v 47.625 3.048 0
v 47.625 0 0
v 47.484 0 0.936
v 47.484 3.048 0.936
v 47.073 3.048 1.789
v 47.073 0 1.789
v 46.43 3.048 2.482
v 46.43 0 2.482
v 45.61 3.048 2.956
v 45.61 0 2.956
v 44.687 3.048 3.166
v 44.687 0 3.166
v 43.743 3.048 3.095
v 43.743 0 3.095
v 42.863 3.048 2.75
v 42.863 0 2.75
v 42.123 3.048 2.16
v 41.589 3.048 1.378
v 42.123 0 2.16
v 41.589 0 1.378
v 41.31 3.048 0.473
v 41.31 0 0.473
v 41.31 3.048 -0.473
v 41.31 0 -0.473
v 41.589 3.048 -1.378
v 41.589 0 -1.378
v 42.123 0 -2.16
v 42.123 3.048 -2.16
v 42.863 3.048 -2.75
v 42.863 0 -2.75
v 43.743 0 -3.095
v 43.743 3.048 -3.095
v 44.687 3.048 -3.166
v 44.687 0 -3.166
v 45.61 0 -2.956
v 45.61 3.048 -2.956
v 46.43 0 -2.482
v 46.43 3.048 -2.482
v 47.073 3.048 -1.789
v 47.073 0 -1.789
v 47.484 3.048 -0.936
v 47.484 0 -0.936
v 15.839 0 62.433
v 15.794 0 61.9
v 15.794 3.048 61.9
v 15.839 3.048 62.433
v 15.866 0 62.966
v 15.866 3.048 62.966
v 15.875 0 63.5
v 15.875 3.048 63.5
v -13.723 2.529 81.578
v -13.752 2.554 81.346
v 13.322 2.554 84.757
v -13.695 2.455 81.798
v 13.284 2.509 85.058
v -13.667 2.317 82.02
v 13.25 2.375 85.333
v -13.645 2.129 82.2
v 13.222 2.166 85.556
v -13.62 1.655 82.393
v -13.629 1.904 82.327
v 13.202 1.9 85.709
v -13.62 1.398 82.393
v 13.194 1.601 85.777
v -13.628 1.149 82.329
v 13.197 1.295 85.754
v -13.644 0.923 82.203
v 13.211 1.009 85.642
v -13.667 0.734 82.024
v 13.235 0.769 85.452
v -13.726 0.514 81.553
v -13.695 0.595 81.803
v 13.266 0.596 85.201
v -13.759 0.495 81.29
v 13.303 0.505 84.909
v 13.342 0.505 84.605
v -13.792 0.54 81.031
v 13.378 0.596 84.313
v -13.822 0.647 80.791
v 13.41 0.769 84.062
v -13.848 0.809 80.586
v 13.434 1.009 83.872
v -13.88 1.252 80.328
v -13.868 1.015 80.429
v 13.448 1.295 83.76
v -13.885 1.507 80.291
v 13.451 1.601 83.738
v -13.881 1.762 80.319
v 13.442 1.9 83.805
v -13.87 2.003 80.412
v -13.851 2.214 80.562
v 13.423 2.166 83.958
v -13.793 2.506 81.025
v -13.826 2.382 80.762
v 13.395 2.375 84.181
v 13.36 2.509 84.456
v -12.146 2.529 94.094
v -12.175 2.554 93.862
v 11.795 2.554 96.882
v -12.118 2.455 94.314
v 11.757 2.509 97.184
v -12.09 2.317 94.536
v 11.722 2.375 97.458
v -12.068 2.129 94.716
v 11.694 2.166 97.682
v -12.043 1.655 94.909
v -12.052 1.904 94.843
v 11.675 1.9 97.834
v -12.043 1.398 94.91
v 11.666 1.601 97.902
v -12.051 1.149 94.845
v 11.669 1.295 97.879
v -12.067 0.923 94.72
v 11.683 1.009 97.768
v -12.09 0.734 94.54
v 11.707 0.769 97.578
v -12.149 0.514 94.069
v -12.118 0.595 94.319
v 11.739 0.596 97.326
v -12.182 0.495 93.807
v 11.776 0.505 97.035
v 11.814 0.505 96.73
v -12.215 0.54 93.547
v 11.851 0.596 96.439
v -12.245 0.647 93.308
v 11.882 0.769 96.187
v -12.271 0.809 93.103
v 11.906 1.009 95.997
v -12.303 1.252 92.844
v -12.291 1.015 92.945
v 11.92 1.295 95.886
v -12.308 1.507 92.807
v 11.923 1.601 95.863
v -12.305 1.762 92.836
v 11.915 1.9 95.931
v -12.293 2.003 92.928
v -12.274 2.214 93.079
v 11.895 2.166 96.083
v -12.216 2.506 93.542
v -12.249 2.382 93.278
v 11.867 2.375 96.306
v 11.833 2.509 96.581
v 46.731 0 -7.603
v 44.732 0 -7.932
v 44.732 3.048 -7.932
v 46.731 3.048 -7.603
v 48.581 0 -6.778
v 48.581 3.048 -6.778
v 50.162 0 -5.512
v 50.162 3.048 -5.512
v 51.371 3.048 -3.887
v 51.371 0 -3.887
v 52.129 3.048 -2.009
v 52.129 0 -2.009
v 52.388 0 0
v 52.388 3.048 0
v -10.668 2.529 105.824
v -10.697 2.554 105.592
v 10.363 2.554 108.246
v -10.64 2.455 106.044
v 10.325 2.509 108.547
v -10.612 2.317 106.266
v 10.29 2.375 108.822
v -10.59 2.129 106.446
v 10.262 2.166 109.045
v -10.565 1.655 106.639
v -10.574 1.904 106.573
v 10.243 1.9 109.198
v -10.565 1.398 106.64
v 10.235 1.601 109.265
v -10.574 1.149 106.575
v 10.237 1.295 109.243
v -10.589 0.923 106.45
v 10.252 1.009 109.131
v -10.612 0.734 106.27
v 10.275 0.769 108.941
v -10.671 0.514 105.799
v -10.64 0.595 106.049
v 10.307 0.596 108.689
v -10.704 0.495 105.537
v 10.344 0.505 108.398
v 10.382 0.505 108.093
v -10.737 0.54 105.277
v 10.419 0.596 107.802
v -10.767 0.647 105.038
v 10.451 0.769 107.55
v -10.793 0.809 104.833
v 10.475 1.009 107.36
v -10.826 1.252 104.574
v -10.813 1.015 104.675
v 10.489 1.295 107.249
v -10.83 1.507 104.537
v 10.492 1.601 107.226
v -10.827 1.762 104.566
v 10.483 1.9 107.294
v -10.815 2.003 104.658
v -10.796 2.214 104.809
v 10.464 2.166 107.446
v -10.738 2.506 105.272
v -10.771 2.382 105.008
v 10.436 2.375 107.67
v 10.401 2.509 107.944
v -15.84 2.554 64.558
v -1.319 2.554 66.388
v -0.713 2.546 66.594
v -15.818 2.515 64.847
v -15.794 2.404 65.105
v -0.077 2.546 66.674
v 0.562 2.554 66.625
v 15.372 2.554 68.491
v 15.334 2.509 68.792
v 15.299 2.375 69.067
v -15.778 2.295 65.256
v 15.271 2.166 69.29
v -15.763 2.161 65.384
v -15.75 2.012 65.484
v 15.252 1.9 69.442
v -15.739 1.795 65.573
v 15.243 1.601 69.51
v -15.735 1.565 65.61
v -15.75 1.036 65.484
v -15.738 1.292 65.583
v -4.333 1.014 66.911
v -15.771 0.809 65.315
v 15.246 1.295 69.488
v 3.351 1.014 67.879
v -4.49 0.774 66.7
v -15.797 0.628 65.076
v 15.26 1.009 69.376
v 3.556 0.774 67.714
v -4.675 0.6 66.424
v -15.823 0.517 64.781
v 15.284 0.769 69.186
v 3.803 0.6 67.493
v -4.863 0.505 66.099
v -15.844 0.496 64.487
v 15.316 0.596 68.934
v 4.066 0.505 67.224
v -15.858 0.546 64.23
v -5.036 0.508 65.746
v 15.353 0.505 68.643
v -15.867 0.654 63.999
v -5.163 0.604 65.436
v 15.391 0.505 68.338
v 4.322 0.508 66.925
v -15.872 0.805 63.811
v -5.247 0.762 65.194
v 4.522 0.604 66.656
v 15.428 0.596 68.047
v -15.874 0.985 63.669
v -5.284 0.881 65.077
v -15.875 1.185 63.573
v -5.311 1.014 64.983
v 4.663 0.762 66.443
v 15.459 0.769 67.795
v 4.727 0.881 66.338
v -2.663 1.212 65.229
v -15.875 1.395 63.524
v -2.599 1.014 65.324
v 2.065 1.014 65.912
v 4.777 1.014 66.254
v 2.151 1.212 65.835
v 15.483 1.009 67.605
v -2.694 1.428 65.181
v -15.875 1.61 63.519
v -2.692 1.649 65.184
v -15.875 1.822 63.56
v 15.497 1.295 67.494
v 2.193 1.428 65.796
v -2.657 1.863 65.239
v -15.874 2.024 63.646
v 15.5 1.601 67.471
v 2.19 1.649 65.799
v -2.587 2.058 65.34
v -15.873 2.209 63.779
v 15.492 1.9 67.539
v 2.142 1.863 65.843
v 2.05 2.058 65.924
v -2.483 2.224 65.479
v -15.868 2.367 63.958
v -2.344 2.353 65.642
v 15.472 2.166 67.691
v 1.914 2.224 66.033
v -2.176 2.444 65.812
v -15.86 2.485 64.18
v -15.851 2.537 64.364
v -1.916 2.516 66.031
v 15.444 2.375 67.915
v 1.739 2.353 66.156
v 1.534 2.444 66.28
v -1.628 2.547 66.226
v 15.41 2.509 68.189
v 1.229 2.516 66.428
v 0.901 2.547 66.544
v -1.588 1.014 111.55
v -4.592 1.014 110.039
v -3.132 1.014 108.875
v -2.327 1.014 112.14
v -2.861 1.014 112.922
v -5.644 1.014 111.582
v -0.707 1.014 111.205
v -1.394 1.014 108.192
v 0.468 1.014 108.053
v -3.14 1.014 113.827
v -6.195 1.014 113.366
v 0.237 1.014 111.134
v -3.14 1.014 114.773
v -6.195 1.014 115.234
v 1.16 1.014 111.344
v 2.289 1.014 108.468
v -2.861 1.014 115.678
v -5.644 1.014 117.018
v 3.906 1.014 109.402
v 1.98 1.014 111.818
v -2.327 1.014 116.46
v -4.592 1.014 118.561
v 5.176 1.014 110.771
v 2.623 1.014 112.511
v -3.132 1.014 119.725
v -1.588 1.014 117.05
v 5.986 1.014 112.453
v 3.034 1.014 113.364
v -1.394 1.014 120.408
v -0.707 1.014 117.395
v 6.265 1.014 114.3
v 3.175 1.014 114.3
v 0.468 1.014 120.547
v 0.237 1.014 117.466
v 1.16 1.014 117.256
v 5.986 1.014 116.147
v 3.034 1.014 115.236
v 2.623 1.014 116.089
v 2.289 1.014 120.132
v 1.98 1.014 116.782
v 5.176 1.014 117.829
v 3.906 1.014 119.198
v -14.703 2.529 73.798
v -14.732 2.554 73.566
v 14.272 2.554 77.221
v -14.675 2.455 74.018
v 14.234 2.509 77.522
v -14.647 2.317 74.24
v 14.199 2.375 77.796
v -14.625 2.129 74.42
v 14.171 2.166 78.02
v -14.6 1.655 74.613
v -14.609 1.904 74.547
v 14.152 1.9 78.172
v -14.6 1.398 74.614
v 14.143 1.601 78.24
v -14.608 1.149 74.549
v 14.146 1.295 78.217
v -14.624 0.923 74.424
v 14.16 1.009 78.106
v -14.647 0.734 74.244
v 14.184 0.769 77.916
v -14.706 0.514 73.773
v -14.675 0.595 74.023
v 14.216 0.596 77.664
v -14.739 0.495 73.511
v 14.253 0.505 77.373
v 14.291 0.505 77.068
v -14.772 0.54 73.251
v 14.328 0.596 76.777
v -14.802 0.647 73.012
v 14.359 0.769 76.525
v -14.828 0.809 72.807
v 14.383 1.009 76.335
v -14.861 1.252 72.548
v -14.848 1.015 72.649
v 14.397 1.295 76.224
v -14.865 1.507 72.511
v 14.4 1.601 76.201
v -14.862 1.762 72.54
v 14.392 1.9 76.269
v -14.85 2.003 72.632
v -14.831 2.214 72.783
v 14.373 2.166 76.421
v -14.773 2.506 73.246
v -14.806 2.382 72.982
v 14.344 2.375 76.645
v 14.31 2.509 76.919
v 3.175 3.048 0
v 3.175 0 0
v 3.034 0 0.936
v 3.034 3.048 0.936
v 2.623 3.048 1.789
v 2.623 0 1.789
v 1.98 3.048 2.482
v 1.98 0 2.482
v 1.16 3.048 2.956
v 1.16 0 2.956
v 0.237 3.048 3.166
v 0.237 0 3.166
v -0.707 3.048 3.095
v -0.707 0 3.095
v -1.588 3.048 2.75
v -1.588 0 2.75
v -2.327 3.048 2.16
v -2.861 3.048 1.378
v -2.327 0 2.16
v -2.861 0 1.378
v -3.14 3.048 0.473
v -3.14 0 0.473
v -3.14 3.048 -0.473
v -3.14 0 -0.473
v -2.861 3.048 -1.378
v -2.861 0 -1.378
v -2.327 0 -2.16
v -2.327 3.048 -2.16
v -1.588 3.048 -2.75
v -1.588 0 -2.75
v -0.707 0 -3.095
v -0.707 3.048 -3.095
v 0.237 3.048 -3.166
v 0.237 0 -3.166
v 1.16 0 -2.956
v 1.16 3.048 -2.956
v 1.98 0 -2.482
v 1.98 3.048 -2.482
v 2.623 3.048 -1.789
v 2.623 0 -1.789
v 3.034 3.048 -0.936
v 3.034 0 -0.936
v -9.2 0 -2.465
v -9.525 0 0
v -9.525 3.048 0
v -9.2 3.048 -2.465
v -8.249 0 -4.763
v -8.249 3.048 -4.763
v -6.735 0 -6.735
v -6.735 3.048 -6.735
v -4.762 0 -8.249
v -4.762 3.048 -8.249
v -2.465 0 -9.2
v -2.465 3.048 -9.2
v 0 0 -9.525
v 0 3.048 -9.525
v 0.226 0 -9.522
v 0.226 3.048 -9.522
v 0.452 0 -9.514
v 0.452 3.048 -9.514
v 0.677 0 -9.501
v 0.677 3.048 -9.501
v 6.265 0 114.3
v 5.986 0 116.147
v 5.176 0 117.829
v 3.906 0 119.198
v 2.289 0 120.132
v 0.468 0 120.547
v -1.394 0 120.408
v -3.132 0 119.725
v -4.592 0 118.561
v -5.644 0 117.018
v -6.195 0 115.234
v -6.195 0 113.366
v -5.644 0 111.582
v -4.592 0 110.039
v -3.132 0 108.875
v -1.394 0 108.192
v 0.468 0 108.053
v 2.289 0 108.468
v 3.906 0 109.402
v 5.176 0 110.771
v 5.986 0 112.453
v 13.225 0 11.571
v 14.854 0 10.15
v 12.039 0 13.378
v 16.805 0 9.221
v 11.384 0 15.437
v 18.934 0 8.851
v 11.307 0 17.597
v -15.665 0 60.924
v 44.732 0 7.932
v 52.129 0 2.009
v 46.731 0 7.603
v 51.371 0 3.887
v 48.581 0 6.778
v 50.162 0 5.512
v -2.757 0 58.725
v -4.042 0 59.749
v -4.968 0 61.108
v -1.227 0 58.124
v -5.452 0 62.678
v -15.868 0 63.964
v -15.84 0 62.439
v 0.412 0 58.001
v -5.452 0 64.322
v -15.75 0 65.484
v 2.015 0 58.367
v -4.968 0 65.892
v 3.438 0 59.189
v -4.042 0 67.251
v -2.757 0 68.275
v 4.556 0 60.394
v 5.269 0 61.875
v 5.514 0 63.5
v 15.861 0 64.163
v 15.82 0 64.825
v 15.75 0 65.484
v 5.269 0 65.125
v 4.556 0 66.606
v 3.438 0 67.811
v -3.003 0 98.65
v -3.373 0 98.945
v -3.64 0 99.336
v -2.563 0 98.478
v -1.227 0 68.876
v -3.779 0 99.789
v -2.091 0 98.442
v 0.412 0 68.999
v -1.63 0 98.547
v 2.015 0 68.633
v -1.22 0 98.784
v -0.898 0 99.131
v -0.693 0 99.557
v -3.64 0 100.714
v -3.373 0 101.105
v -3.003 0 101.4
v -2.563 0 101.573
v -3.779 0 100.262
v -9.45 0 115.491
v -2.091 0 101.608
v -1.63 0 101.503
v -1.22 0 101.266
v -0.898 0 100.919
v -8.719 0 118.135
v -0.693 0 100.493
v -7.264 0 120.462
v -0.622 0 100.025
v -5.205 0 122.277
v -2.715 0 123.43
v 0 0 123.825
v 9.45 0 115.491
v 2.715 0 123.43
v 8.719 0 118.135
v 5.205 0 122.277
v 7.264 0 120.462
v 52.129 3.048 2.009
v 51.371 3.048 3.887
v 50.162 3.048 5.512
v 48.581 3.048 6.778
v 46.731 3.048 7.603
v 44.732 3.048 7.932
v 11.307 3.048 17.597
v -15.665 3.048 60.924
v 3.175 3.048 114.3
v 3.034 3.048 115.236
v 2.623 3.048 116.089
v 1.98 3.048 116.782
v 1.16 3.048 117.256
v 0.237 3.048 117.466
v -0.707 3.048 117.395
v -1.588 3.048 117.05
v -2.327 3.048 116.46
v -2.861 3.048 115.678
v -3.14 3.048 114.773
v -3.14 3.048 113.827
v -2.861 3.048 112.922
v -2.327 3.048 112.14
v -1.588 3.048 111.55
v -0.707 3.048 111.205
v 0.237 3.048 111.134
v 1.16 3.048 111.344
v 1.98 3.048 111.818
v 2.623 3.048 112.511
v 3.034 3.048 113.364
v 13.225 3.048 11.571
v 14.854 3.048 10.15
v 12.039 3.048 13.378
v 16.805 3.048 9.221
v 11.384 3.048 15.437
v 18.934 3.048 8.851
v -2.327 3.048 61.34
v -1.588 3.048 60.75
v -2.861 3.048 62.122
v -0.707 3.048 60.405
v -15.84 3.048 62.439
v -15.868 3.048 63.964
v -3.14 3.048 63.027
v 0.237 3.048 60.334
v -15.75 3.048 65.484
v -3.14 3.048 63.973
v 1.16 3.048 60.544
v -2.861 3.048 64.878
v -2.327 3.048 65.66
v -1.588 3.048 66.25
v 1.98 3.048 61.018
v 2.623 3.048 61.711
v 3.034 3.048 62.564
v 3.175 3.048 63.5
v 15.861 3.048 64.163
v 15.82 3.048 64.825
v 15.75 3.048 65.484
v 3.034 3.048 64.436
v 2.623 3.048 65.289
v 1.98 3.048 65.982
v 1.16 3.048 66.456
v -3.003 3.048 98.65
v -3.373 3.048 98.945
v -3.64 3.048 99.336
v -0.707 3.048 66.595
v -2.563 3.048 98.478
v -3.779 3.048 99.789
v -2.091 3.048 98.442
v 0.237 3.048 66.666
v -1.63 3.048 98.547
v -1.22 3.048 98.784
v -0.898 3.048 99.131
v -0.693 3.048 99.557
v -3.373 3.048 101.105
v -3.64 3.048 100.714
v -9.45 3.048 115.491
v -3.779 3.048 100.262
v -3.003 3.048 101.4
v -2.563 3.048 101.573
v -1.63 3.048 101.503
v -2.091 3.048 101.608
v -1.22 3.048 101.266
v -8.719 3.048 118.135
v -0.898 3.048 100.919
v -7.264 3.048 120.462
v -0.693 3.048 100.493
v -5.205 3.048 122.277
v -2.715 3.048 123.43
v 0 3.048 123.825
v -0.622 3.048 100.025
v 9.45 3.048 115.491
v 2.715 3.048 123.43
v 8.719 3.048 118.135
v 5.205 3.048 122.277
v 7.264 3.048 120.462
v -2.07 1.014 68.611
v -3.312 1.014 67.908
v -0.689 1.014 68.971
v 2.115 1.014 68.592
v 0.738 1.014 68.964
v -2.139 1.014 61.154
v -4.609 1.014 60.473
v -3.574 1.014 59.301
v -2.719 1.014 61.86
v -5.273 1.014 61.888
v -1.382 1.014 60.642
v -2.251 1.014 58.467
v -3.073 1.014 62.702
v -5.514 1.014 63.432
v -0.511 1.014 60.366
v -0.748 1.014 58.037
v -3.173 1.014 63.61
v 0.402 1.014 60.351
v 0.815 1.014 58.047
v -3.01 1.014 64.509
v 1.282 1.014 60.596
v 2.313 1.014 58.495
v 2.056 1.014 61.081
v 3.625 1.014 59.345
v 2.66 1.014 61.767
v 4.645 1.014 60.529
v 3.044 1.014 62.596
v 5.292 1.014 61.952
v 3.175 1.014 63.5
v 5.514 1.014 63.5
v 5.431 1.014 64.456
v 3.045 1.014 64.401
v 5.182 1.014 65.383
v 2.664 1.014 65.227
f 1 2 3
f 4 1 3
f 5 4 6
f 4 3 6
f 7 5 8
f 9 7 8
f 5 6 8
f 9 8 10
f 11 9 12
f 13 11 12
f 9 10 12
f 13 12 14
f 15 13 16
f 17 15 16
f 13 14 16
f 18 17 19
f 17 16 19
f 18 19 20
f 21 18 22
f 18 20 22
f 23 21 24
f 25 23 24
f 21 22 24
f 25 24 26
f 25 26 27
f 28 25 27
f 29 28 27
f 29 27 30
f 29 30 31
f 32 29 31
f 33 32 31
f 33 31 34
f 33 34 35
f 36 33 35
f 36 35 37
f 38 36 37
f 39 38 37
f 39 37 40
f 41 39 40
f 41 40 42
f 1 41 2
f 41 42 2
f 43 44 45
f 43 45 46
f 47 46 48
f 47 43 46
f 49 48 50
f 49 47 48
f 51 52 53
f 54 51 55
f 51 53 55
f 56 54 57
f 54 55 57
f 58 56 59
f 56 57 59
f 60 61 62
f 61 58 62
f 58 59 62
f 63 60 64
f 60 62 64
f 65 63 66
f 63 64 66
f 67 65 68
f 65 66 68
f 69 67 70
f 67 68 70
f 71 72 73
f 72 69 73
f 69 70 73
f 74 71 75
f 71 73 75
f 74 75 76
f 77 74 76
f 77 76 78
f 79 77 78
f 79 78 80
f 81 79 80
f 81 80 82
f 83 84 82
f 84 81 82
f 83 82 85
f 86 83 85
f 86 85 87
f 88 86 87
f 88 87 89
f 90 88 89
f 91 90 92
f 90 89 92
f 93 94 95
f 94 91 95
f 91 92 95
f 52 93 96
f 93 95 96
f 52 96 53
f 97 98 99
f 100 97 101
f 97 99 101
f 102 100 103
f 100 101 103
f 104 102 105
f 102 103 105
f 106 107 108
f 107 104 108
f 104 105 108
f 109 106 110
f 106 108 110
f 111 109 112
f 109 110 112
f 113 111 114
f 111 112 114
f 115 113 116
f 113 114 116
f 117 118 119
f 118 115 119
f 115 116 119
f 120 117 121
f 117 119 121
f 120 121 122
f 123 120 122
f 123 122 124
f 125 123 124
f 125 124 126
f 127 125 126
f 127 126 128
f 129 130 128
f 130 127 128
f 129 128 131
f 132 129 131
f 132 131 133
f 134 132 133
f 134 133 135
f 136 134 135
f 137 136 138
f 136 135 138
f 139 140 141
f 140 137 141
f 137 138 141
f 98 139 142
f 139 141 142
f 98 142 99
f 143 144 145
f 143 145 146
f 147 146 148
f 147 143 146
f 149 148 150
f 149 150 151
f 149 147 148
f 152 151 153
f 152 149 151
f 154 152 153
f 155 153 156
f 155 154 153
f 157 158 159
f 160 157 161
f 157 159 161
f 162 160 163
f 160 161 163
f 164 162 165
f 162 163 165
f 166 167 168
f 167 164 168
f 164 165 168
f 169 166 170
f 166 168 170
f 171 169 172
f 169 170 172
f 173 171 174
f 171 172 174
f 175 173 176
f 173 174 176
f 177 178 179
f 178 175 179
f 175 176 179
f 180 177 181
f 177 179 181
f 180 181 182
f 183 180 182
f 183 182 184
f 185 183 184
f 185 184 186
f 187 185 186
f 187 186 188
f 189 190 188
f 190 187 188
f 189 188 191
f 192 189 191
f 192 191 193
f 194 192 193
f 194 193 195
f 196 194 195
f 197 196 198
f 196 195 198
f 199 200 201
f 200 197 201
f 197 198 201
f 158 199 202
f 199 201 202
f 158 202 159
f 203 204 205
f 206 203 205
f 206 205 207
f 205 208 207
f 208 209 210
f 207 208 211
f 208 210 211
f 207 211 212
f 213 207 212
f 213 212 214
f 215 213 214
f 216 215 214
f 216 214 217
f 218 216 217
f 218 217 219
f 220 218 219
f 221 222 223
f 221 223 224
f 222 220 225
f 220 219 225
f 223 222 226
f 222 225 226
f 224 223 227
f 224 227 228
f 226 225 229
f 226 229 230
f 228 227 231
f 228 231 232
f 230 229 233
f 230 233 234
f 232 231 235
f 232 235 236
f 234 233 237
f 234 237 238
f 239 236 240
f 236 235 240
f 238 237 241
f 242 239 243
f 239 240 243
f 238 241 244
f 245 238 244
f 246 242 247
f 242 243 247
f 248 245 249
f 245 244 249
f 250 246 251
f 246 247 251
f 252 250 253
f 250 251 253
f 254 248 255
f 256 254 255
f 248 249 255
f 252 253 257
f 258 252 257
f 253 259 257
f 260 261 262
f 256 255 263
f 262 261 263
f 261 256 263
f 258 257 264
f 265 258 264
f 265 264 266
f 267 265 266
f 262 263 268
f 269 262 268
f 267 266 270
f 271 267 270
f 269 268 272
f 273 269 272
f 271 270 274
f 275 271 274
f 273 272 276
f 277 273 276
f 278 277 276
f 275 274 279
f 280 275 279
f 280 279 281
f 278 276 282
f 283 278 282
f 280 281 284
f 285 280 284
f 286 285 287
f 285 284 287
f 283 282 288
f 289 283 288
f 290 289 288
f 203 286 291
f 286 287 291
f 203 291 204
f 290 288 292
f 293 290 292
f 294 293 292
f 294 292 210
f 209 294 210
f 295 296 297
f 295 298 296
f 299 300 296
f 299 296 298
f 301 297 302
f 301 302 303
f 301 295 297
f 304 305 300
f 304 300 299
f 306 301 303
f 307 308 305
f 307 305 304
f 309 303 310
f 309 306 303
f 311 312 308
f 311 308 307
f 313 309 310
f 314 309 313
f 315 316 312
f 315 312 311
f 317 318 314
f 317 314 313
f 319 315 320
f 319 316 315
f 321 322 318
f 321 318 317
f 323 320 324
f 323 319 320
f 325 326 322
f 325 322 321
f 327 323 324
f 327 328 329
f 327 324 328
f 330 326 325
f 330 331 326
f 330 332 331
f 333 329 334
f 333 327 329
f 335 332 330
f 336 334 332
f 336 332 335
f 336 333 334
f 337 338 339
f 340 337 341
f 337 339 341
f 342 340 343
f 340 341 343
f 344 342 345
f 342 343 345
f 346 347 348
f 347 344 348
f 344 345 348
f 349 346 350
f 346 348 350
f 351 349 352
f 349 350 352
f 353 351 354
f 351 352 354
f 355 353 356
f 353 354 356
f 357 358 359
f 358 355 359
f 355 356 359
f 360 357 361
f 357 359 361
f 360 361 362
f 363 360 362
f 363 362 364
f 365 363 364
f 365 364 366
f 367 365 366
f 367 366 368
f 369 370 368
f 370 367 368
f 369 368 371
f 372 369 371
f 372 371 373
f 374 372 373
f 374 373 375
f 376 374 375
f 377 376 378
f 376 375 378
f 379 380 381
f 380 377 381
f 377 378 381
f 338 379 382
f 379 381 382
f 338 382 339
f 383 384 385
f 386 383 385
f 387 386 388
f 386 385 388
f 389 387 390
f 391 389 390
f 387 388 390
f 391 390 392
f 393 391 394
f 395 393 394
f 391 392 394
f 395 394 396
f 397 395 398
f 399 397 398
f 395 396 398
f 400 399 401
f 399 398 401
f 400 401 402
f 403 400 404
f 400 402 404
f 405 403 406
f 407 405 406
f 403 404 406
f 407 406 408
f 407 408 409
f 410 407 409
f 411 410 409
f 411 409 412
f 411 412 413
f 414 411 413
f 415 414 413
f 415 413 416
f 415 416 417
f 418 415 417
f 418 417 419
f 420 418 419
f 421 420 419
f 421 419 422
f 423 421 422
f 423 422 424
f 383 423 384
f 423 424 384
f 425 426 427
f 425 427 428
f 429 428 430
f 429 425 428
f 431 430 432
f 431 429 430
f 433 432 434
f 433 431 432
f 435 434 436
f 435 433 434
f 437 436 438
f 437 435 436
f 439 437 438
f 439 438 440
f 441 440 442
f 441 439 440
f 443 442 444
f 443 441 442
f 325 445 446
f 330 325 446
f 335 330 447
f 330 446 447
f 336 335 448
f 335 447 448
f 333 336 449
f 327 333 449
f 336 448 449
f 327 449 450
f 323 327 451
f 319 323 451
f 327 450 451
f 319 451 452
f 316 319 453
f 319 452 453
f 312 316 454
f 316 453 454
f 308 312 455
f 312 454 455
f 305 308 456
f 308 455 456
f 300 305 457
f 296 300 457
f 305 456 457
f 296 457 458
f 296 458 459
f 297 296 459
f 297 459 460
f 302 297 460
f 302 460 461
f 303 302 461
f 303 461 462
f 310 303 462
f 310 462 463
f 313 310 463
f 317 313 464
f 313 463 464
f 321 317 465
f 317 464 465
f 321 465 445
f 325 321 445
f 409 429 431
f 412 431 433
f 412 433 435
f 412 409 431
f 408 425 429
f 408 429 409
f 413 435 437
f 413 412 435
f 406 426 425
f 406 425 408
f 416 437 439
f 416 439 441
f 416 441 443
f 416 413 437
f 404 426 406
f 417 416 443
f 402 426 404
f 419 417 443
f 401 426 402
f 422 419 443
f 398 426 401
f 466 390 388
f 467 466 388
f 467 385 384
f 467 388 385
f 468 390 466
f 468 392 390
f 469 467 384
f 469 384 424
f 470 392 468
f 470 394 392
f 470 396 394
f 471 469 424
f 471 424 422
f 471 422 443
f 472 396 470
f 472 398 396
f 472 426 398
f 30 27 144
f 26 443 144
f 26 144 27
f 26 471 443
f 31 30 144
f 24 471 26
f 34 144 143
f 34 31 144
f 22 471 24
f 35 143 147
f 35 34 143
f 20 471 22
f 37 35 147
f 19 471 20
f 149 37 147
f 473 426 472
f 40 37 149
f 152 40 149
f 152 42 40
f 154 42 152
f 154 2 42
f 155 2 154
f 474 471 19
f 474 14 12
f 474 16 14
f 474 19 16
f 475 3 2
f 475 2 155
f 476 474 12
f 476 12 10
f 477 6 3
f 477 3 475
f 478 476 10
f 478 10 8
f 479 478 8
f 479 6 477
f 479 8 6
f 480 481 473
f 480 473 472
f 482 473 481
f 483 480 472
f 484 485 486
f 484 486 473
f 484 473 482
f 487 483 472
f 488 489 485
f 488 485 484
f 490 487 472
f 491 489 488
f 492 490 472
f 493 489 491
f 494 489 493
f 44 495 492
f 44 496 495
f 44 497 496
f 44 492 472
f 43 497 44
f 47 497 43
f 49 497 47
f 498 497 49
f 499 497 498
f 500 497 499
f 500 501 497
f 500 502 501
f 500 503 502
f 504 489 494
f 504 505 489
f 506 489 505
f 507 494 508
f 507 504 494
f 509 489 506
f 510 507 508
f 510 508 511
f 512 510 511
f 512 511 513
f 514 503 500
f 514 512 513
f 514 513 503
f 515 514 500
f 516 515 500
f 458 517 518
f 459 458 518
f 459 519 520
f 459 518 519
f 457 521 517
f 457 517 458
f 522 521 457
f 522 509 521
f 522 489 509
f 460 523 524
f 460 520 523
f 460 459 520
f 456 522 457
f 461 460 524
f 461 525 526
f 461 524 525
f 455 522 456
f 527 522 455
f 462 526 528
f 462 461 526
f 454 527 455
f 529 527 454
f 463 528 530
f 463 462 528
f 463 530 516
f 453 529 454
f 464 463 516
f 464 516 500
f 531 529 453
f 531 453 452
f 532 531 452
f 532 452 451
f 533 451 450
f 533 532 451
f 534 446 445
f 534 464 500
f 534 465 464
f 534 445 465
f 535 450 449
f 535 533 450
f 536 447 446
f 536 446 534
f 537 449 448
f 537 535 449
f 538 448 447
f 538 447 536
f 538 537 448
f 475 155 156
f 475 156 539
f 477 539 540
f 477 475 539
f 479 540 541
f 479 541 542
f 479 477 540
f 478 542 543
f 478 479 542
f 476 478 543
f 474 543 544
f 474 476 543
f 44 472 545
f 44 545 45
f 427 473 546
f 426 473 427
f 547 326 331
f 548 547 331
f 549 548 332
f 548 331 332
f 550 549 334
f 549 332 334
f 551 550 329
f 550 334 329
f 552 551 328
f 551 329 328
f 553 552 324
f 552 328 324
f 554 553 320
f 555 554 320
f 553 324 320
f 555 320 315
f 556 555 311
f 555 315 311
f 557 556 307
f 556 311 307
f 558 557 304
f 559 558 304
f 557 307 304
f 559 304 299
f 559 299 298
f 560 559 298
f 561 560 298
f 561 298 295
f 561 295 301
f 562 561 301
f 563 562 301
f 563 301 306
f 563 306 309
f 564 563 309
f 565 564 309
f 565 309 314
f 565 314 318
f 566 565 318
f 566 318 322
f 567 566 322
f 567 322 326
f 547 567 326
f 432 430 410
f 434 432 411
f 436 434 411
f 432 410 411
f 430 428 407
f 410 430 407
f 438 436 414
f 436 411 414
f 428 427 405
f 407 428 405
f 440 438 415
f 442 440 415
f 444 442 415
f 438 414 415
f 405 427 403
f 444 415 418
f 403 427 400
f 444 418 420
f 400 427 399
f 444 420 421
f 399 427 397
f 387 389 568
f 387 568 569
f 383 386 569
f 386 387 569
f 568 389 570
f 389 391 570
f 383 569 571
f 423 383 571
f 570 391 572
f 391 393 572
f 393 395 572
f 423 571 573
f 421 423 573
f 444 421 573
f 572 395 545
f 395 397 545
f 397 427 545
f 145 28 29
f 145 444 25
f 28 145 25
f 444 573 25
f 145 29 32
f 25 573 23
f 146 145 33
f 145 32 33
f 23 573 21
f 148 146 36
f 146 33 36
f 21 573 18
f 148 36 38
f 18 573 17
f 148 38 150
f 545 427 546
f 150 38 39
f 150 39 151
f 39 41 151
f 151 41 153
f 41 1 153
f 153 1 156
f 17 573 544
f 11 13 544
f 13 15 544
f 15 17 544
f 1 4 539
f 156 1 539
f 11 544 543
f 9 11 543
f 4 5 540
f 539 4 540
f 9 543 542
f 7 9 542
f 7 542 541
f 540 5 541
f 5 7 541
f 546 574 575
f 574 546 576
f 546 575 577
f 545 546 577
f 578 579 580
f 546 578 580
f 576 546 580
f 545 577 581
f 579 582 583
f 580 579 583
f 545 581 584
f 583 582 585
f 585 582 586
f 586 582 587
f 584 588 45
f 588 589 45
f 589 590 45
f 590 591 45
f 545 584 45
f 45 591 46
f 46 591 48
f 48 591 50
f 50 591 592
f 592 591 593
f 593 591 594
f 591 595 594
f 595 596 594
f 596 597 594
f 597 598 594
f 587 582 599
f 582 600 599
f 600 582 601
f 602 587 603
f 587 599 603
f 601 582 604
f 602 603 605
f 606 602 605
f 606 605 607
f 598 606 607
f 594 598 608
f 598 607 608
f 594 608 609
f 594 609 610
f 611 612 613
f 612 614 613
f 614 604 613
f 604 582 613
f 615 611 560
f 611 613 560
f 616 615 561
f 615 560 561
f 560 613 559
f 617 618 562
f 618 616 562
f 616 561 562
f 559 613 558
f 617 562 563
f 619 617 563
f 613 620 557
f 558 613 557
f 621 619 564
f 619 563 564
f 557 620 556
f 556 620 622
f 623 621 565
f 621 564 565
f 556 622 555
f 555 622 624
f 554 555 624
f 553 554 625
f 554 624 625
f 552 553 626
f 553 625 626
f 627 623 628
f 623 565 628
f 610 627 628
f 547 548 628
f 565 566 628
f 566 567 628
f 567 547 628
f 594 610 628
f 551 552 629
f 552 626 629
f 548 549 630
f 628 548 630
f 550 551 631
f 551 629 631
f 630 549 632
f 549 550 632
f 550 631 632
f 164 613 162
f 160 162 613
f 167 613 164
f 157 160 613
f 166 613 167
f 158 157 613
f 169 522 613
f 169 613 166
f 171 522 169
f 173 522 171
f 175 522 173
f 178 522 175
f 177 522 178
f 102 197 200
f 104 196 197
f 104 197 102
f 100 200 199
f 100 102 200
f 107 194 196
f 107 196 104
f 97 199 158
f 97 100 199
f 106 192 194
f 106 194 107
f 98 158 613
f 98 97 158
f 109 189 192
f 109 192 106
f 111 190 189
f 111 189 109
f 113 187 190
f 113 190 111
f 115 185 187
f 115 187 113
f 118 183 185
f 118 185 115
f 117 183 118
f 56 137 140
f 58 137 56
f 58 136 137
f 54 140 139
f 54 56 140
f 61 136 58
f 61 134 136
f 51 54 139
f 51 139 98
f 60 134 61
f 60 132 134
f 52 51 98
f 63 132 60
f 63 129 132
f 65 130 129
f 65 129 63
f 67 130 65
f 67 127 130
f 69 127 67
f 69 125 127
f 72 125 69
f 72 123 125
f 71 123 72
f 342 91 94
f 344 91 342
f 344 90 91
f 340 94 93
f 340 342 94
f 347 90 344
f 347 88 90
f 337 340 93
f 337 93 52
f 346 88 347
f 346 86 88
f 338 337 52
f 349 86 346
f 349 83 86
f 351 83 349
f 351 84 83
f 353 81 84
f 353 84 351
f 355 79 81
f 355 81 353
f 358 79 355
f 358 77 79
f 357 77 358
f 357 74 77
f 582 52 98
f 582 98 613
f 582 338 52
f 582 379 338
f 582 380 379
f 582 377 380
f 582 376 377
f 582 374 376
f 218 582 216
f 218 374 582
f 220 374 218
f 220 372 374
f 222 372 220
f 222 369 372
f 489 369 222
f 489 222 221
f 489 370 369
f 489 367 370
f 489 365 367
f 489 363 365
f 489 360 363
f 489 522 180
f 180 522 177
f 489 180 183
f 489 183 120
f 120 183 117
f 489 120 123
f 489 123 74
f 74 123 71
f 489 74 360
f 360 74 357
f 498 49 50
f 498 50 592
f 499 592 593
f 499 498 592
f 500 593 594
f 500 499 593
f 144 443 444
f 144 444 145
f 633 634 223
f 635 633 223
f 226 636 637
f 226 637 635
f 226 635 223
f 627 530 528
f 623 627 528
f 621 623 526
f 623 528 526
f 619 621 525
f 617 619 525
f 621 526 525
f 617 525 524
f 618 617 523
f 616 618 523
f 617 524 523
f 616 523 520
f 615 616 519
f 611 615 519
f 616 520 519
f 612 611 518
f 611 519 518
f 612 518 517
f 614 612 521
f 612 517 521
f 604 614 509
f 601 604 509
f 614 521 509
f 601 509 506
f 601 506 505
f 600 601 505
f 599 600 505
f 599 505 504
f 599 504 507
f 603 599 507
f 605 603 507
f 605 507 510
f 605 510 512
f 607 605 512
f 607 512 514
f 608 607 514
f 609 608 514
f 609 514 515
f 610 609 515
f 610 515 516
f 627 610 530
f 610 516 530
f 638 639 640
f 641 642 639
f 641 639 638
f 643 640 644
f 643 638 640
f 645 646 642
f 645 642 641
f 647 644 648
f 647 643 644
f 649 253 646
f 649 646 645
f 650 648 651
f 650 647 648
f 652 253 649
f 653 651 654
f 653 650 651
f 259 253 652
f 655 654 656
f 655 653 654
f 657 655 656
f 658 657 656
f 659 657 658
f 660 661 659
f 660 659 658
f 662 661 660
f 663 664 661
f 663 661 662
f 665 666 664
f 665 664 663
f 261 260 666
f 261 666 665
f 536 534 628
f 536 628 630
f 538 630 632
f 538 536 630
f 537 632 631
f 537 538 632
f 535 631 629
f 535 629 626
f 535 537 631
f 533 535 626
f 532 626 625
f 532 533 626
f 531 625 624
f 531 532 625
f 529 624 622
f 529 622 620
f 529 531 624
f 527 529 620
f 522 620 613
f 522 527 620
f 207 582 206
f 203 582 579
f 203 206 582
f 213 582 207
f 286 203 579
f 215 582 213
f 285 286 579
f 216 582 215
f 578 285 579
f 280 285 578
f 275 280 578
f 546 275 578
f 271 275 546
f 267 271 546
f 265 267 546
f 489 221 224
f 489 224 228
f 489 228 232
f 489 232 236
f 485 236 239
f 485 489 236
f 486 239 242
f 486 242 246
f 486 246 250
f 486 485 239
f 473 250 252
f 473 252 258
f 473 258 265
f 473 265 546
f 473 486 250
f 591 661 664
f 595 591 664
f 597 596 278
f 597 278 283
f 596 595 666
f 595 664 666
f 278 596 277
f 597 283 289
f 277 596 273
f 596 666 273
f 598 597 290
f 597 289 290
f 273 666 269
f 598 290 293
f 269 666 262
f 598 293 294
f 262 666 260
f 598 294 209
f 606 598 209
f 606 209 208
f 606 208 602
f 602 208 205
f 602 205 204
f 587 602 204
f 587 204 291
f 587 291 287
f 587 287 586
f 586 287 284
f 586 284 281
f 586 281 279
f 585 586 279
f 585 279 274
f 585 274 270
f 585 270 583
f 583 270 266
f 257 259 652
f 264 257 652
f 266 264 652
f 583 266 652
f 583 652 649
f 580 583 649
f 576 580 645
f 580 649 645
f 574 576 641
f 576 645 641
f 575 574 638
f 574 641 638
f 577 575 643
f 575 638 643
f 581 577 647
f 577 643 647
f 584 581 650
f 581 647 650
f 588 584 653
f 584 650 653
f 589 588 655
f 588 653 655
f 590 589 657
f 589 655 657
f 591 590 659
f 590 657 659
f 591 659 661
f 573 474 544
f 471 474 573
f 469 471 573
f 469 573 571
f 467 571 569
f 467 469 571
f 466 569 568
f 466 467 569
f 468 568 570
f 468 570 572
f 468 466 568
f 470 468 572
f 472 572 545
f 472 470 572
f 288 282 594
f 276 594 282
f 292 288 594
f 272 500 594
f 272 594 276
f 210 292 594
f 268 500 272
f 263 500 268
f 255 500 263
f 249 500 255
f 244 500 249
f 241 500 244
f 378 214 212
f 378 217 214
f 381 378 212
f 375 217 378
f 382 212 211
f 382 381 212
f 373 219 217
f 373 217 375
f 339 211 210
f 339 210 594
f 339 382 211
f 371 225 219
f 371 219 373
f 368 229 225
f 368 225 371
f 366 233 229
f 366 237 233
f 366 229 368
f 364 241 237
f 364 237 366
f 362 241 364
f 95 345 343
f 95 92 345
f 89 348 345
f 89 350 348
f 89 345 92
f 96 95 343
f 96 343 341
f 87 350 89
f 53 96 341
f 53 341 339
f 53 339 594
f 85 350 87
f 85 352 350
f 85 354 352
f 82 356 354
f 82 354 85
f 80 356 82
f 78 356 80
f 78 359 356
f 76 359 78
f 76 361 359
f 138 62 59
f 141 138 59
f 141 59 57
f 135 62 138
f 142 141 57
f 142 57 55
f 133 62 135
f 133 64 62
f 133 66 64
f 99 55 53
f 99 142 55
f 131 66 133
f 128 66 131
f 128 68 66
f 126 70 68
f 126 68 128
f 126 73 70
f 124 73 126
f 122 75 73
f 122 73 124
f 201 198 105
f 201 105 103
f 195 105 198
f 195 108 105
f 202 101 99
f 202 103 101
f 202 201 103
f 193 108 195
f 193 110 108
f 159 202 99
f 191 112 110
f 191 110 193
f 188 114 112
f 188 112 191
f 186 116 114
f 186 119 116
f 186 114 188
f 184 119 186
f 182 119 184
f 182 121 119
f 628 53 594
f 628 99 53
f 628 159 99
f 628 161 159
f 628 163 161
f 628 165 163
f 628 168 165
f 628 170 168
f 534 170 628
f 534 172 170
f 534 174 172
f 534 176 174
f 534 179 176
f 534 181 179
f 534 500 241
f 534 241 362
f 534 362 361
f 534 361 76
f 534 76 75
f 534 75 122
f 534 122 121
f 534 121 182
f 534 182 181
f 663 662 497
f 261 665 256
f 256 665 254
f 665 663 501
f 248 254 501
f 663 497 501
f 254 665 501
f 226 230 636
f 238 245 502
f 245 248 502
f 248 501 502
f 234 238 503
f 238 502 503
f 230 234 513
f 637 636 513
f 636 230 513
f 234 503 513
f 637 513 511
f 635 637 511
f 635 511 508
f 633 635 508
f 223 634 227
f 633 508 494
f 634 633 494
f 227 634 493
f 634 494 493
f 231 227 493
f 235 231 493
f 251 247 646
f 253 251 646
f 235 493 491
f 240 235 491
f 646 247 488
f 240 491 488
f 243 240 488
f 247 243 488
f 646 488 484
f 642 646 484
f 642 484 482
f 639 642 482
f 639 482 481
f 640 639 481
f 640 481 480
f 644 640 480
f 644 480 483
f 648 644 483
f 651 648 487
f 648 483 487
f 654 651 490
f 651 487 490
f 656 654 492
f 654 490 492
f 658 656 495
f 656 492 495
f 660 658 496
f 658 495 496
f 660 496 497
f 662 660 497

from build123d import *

# Parameters (mm, degrees)
F0_R     = 3.175
F0_R_2   = 1.5875
F1_DEPTH = 3.048
F2_R     = 6.2647039053
F2_R_2   = 3.175
F2_R_3   = 5.5140447668
F3_DEPTH = 1.01377
F4_R     = 1.0304590852
F5_DEPTH = 34.51469


with BuildPart() as f1:
    # F0 (on Front) → F1 (new body)
    with BuildSketch(Plane.XZ):
        with BuildLine():
            ThreePointArc((-9.4502929642, 115.490625), (-0.596483242, 104.7936951058), (9.525, 114.3))
            ThreePointArc((9.525, 114.3), (9.5063048942, 114.896483242), (9.4502929642, 115.490625))
            ThreePointArc((9.4502929642, 115.490625), (0, 123.825), (-9.4502929642, 115.490625))
        make_face()
        with Locations((0, 114.3)):
            Circle(F0_R, mode=Mode.SUBTRACT)
        with BuildLine():
            ThreePointArc((52.3875, 0), (50.1616327839, 5.5119104847), (44.7324052746, 7.9324746146))
            ThreePointArc((44.7324052746, 7.9324746146), (36.5125, 0), (44.7324052746, -7.9324746146))
            ThreePointArc((44.7324052746, -7.9324746146), (50.1616327839, -5.5119104847), (52.3875, 0))
        make_face()
        with Locations((44.45, 0)):
            Circle(F0_R, mode=Mode.SUBTRACT)
        with BuildLine():
            ThreePointArc((9.4502929642, 115.490625), (9.5063048942, 114.896483242), (9.525, 114.3))
            ThreePointArc((9.525, 114.3), (-0.596483242, 104.7936951058), (-9.4502929642, 115.490625))
            Line((-9.4502929642, 115.490625), (-15.7504882737, 65.484375))
            ThreePointArc((-15.7504882737, 65.484375), (0, 79.375), (15.7504882737, 65.484375))
            Line((15.7504882737, 65.484375), (9.4502929642, 115.490625))
        make_face()
        with Locations((-2.209718572, 100.0252)):
            Circle(F0_R_2, mode=Mode.SUBTRACT)
        with BuildLine():
            ThreePointArc((15.875, 63.5), (15.8438414904, 64.4941387366), (15.7504882737, 65.484375))
            ThreePointArc((15.7504882737, 65.484375), (0, 79.375), (-15.7504882737, 65.484375))
            ThreePointArc((-15.7504882737, 65.484375), (-15.8721860132, 63.2011084429), (-15.6646119555, 60.9240424533))
            ThreePointArc((-15.6646119555, 60.9240424533), (0.4924504072, 47.6326398668), (15.7942028036, 61.9003804205))
            ThreePointArc((15.7942028036, 61.9003804205), (15.8547878338, 62.6991705884), (15.875, 63.5))
        make_face()
        with Locations((0, 63.5)):
            Circle(F0_R, mode=Mode.SUBTRACT)
        with BuildLine():
            ThreePointArc((15.7942028036, 61.9003804205), (0.4924504072, 47.6326398668), (-15.6646119555, 60.9240424533))
            Line((-15.6646119555, 60.9240424533), (-9.525, 0))
            ThreePointArc((-9.525, 0), (0, 9.525), (9.525, 0))
            ThreePointArc((9.525, 0), (6.9705567315, -6.4912990883), (0.6773435479, -9.500885786))
            Line((0.6773435479, -9.500885786), (44.7324052746, -7.9324746146))
            ThreePointArc((44.7324052746, -7.9324746146), (36.5125, 0), (44.7324052746, 7.9324746146))
            Line((44.7324052746, 7.9324746146), (18.9341027877, 8.850924033))
            ThreePointArc((18.9341027877, 8.850924033), (13.2249738114, 11.5709798305), (11.3072231466, 17.5971800924))
            Line((11.3072231466, 17.5971800924), (15.7942028036, 61.9003804205))
        make_face()
        with BuildLine():
            ThreePointArc((9.525, 0), (0, 9.525), (-9.525, 0))
            ThreePointArc((-9.525, 0), (-6.7351920908, -6.7351920908), (0, -9.525))
            Line((0, -9.525), (0.6773435479, -9.500885786))
            ThreePointArc((0.6773435479, -9.500885786), (6.9705567315, -6.4912990883), (9.525, 0))
        make_face()
        Circle(F0_R, mode=Mode.SUBTRACT)
        with BuildLine():
            Line((0.6773435479, -9.500885786), (0, -9.525))
            ThreePointArc((0, -9.525), (0.3388863295, -9.5189695375), (0.6773435479, -9.500885786))
        make_face()
    extrude(amount=-F1_DEPTH)

    # F2 (on face) → F3 (cut)
    with BuildSketch(Plane.XZ):
        with Locations((0, 114.3)):
            Circle(F2_R)
        with Locations((0, 114.3)):
            Circle(F2_R_2, mode=Mode.SUBTRACT)
        with Locations((0, 63.5)):
            Circle(F2_R_3)
        with Locations((0, 63.5)):
            Circle(F2_R_2, mode=Mode.SUBTRACT)
    extrude(amount=-F3_DEPTH, mode=Mode.SUBTRACT)

    # F4 (on face) → F5 (cut)
    with BuildSketch(Plane(origin=(23.6257324105, 0, 2.9765625), x_dir=(0, 1, 0), z_dir=(0.9921567416, 0, 0.125))):
        with Locations((1.524, 66.0321041942)):
            Circle(F4_R)
        with Locations((1.524, 74.8308971524)):
            Circle(F4_R)
        with Locations((1.524, 82.4269801378)):
            Circle(F4_R)
        with Locations((1.524, 94.6481488792)):
            Circle(F4_R)
        with Locations((1.524, 106.101423502)):
            Circle(F4_R)
    extrude(amount=-F5_DEPTH, mode=Mode.SUBTRACT)


solid = f1.part
